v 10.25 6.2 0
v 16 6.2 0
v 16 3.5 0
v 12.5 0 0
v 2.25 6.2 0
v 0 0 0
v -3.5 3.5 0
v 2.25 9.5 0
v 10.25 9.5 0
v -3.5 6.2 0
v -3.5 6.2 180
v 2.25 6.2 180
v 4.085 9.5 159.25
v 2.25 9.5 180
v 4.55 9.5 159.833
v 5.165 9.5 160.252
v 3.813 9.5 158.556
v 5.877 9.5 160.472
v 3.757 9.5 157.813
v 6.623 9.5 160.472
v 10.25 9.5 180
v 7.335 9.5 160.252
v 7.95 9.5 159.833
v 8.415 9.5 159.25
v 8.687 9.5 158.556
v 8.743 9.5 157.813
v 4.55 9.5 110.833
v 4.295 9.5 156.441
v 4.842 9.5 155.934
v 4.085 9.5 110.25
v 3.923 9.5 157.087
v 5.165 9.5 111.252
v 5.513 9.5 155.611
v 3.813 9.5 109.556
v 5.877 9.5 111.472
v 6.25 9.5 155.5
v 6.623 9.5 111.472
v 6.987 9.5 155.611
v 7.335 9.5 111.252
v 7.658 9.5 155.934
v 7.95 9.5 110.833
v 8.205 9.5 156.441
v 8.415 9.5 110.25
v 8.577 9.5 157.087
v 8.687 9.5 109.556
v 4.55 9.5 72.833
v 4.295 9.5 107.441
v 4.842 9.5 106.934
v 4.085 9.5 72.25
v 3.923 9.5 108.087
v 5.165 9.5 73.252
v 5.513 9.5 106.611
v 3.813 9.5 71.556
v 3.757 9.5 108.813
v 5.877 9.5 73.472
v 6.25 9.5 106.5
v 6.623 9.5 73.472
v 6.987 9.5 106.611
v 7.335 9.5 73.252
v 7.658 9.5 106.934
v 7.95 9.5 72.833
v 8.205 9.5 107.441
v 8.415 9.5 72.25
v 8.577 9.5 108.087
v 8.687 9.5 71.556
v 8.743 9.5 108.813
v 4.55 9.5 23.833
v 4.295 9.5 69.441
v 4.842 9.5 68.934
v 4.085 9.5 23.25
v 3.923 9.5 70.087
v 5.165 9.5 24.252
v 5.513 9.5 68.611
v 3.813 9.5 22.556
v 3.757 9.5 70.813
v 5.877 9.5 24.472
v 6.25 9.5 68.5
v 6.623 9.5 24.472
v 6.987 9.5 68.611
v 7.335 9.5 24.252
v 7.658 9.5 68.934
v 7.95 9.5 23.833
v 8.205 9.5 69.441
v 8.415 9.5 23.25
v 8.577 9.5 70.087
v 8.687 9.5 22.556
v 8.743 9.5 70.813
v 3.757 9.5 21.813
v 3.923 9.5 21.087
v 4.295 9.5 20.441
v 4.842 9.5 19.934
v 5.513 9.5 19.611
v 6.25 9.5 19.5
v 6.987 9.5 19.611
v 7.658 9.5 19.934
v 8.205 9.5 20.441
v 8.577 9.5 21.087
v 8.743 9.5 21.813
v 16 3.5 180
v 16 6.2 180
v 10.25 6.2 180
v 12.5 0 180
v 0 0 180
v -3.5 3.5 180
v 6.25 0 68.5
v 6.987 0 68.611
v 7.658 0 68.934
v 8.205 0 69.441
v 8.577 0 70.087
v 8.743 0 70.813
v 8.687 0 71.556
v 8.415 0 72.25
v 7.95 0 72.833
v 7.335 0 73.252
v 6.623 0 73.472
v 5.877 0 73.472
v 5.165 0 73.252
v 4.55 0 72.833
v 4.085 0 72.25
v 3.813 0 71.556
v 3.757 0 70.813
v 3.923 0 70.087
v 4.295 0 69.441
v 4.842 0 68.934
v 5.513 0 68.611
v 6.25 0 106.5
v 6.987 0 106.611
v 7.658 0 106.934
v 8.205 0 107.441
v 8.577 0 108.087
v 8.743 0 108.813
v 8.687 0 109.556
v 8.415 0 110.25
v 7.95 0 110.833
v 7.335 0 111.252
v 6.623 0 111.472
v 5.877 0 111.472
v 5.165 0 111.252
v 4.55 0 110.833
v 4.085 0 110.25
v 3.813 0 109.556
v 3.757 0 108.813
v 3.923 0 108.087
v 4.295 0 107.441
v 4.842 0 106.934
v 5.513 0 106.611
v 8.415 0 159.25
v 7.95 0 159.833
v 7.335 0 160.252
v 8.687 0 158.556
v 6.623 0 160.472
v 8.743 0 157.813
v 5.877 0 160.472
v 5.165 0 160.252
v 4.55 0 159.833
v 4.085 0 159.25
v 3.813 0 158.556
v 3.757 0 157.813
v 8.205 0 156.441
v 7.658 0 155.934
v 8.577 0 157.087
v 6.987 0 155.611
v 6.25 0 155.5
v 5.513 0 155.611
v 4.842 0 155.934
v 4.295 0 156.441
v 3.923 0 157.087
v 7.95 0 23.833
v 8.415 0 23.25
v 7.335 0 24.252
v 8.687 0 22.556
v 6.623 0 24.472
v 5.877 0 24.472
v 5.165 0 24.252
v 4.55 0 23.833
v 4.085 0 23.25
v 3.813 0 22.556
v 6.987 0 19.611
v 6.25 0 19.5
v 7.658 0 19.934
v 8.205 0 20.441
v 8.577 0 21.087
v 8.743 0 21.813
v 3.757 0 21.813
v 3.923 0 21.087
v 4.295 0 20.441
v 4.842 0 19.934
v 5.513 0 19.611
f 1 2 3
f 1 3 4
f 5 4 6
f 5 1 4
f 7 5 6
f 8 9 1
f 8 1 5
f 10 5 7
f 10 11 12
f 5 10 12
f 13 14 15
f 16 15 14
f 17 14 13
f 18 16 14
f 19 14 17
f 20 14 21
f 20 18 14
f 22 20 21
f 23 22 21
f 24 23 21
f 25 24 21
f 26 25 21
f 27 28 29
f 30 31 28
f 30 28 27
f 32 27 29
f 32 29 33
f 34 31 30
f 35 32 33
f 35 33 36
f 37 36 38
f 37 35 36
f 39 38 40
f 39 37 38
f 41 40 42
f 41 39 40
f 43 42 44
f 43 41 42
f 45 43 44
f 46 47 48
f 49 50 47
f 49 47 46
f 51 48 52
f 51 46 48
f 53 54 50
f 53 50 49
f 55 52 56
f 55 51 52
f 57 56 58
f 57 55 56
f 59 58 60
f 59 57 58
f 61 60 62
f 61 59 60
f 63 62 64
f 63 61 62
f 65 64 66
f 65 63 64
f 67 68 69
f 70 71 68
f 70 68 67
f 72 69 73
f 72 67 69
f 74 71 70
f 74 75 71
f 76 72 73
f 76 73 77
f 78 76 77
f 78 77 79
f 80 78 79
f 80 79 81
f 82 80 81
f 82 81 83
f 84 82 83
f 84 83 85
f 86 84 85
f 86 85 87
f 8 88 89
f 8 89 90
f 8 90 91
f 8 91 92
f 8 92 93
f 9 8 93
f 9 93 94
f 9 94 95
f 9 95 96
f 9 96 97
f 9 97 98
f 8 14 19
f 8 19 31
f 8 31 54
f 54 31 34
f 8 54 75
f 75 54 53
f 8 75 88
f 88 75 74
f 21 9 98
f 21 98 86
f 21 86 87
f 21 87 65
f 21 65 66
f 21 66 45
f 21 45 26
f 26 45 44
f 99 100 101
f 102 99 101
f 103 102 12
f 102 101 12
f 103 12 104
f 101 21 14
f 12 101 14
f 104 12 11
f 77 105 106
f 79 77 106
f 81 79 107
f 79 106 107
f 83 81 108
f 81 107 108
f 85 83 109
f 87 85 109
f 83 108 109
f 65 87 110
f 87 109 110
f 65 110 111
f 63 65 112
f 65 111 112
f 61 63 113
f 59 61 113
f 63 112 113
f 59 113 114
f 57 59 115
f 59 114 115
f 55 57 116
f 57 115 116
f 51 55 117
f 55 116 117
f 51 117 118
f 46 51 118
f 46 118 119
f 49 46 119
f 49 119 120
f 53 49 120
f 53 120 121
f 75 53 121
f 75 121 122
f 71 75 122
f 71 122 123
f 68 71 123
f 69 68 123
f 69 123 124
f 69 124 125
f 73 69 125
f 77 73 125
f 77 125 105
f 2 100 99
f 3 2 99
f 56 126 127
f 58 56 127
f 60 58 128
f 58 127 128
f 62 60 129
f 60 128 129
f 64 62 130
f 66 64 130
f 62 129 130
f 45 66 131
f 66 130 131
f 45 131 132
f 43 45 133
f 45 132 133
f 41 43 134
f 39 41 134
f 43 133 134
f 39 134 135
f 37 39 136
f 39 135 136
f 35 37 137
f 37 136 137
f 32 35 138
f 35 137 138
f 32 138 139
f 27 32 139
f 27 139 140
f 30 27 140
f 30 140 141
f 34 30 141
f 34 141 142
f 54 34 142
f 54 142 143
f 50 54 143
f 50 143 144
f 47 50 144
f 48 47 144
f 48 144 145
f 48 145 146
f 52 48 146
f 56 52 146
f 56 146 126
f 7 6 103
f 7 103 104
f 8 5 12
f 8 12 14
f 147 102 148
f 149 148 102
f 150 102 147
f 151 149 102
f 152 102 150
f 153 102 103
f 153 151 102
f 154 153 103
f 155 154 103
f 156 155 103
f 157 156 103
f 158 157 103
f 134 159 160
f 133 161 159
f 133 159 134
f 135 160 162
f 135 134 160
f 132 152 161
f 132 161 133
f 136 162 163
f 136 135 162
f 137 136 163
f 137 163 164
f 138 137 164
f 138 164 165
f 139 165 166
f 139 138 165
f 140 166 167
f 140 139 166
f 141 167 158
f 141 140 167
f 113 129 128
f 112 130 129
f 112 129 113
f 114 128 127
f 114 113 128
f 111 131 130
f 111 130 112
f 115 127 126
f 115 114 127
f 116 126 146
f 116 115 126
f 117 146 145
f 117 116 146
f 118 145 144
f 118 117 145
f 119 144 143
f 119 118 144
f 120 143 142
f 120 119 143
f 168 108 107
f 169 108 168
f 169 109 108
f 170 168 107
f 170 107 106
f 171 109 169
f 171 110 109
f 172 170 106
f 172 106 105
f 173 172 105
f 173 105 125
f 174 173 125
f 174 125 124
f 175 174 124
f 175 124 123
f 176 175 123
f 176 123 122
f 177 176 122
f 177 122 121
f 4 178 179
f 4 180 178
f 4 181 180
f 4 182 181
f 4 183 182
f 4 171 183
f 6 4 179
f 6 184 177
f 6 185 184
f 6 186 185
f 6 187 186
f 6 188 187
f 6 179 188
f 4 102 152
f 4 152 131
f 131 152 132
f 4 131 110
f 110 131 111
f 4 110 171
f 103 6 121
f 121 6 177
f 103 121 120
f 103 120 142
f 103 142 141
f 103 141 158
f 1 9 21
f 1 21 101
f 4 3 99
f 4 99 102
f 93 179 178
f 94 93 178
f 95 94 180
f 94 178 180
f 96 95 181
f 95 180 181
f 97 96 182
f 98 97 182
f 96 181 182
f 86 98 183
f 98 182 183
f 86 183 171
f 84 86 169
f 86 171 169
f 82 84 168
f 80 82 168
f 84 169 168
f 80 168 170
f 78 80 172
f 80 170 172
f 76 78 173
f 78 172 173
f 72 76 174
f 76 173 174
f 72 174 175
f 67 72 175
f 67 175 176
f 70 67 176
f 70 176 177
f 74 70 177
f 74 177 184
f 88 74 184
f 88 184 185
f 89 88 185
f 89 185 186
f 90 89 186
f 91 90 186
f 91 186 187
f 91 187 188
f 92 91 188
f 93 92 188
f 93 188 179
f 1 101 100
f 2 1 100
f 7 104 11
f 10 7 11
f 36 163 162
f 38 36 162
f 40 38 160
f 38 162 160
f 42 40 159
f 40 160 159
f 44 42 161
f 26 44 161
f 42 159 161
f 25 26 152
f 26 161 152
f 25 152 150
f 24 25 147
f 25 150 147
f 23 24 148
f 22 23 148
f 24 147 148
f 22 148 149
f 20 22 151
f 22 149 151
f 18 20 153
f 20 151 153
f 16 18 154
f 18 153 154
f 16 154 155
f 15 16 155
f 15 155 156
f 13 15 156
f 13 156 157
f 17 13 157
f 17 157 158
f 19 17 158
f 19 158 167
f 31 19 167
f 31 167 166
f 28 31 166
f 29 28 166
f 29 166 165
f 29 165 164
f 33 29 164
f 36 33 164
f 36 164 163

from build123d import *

# Parameters (mm, degrees)
EXTRUDE_1_DEPTH        = 180
HOLE_WIZARD_M6_1_D     = 5
HOLE_WIZARD_M6_1_DEPTH = 28
HOLE_WIZARD_M6_1_TIP   = 1.502151548


with BuildPart() as part:
    # 草图1 → 凸台-拉伸1 (new body)
    with BuildSketch(Plane.XY):
        Polygon((12.5, 0), (0, 0), (-3.5, 3.5), (-3.5, 6.2), (2.25, 6.2), (2.25, 9.5), (10.25, 9.5), (10.25, 6.2), (16, 6.2), (16, 3.5), align=None)
    extrude(amount=EXTRUDE_1_DEPTH)

    # M6 螺纹孔1
    with Locations(Plane(origin=(6.25, 9.5, 158), x_dir=(0, 0, 1), z_dir=(0, 1, 0))):
        with Locations((0, 0), (-49, 0), (-136, 0), (-87, 0)):
            Hole(HOLE_WIZARD_M6_1_D / 2, depth=HOLE_WIZARD_M6_1_DEPTH)
            with Locations((0, 0, -(HOLE_WIZARD_M6_1_DEPTH + HOLE_WIZARD_M6_1_TIP / 2))):  # 118° drill point
                Cone(0, HOLE_WIZARD_M6_1_D / 2, HOLE_WIZARD_M6_1_TIP, mode=Mode.SUBTRACT)


solid = part.part
